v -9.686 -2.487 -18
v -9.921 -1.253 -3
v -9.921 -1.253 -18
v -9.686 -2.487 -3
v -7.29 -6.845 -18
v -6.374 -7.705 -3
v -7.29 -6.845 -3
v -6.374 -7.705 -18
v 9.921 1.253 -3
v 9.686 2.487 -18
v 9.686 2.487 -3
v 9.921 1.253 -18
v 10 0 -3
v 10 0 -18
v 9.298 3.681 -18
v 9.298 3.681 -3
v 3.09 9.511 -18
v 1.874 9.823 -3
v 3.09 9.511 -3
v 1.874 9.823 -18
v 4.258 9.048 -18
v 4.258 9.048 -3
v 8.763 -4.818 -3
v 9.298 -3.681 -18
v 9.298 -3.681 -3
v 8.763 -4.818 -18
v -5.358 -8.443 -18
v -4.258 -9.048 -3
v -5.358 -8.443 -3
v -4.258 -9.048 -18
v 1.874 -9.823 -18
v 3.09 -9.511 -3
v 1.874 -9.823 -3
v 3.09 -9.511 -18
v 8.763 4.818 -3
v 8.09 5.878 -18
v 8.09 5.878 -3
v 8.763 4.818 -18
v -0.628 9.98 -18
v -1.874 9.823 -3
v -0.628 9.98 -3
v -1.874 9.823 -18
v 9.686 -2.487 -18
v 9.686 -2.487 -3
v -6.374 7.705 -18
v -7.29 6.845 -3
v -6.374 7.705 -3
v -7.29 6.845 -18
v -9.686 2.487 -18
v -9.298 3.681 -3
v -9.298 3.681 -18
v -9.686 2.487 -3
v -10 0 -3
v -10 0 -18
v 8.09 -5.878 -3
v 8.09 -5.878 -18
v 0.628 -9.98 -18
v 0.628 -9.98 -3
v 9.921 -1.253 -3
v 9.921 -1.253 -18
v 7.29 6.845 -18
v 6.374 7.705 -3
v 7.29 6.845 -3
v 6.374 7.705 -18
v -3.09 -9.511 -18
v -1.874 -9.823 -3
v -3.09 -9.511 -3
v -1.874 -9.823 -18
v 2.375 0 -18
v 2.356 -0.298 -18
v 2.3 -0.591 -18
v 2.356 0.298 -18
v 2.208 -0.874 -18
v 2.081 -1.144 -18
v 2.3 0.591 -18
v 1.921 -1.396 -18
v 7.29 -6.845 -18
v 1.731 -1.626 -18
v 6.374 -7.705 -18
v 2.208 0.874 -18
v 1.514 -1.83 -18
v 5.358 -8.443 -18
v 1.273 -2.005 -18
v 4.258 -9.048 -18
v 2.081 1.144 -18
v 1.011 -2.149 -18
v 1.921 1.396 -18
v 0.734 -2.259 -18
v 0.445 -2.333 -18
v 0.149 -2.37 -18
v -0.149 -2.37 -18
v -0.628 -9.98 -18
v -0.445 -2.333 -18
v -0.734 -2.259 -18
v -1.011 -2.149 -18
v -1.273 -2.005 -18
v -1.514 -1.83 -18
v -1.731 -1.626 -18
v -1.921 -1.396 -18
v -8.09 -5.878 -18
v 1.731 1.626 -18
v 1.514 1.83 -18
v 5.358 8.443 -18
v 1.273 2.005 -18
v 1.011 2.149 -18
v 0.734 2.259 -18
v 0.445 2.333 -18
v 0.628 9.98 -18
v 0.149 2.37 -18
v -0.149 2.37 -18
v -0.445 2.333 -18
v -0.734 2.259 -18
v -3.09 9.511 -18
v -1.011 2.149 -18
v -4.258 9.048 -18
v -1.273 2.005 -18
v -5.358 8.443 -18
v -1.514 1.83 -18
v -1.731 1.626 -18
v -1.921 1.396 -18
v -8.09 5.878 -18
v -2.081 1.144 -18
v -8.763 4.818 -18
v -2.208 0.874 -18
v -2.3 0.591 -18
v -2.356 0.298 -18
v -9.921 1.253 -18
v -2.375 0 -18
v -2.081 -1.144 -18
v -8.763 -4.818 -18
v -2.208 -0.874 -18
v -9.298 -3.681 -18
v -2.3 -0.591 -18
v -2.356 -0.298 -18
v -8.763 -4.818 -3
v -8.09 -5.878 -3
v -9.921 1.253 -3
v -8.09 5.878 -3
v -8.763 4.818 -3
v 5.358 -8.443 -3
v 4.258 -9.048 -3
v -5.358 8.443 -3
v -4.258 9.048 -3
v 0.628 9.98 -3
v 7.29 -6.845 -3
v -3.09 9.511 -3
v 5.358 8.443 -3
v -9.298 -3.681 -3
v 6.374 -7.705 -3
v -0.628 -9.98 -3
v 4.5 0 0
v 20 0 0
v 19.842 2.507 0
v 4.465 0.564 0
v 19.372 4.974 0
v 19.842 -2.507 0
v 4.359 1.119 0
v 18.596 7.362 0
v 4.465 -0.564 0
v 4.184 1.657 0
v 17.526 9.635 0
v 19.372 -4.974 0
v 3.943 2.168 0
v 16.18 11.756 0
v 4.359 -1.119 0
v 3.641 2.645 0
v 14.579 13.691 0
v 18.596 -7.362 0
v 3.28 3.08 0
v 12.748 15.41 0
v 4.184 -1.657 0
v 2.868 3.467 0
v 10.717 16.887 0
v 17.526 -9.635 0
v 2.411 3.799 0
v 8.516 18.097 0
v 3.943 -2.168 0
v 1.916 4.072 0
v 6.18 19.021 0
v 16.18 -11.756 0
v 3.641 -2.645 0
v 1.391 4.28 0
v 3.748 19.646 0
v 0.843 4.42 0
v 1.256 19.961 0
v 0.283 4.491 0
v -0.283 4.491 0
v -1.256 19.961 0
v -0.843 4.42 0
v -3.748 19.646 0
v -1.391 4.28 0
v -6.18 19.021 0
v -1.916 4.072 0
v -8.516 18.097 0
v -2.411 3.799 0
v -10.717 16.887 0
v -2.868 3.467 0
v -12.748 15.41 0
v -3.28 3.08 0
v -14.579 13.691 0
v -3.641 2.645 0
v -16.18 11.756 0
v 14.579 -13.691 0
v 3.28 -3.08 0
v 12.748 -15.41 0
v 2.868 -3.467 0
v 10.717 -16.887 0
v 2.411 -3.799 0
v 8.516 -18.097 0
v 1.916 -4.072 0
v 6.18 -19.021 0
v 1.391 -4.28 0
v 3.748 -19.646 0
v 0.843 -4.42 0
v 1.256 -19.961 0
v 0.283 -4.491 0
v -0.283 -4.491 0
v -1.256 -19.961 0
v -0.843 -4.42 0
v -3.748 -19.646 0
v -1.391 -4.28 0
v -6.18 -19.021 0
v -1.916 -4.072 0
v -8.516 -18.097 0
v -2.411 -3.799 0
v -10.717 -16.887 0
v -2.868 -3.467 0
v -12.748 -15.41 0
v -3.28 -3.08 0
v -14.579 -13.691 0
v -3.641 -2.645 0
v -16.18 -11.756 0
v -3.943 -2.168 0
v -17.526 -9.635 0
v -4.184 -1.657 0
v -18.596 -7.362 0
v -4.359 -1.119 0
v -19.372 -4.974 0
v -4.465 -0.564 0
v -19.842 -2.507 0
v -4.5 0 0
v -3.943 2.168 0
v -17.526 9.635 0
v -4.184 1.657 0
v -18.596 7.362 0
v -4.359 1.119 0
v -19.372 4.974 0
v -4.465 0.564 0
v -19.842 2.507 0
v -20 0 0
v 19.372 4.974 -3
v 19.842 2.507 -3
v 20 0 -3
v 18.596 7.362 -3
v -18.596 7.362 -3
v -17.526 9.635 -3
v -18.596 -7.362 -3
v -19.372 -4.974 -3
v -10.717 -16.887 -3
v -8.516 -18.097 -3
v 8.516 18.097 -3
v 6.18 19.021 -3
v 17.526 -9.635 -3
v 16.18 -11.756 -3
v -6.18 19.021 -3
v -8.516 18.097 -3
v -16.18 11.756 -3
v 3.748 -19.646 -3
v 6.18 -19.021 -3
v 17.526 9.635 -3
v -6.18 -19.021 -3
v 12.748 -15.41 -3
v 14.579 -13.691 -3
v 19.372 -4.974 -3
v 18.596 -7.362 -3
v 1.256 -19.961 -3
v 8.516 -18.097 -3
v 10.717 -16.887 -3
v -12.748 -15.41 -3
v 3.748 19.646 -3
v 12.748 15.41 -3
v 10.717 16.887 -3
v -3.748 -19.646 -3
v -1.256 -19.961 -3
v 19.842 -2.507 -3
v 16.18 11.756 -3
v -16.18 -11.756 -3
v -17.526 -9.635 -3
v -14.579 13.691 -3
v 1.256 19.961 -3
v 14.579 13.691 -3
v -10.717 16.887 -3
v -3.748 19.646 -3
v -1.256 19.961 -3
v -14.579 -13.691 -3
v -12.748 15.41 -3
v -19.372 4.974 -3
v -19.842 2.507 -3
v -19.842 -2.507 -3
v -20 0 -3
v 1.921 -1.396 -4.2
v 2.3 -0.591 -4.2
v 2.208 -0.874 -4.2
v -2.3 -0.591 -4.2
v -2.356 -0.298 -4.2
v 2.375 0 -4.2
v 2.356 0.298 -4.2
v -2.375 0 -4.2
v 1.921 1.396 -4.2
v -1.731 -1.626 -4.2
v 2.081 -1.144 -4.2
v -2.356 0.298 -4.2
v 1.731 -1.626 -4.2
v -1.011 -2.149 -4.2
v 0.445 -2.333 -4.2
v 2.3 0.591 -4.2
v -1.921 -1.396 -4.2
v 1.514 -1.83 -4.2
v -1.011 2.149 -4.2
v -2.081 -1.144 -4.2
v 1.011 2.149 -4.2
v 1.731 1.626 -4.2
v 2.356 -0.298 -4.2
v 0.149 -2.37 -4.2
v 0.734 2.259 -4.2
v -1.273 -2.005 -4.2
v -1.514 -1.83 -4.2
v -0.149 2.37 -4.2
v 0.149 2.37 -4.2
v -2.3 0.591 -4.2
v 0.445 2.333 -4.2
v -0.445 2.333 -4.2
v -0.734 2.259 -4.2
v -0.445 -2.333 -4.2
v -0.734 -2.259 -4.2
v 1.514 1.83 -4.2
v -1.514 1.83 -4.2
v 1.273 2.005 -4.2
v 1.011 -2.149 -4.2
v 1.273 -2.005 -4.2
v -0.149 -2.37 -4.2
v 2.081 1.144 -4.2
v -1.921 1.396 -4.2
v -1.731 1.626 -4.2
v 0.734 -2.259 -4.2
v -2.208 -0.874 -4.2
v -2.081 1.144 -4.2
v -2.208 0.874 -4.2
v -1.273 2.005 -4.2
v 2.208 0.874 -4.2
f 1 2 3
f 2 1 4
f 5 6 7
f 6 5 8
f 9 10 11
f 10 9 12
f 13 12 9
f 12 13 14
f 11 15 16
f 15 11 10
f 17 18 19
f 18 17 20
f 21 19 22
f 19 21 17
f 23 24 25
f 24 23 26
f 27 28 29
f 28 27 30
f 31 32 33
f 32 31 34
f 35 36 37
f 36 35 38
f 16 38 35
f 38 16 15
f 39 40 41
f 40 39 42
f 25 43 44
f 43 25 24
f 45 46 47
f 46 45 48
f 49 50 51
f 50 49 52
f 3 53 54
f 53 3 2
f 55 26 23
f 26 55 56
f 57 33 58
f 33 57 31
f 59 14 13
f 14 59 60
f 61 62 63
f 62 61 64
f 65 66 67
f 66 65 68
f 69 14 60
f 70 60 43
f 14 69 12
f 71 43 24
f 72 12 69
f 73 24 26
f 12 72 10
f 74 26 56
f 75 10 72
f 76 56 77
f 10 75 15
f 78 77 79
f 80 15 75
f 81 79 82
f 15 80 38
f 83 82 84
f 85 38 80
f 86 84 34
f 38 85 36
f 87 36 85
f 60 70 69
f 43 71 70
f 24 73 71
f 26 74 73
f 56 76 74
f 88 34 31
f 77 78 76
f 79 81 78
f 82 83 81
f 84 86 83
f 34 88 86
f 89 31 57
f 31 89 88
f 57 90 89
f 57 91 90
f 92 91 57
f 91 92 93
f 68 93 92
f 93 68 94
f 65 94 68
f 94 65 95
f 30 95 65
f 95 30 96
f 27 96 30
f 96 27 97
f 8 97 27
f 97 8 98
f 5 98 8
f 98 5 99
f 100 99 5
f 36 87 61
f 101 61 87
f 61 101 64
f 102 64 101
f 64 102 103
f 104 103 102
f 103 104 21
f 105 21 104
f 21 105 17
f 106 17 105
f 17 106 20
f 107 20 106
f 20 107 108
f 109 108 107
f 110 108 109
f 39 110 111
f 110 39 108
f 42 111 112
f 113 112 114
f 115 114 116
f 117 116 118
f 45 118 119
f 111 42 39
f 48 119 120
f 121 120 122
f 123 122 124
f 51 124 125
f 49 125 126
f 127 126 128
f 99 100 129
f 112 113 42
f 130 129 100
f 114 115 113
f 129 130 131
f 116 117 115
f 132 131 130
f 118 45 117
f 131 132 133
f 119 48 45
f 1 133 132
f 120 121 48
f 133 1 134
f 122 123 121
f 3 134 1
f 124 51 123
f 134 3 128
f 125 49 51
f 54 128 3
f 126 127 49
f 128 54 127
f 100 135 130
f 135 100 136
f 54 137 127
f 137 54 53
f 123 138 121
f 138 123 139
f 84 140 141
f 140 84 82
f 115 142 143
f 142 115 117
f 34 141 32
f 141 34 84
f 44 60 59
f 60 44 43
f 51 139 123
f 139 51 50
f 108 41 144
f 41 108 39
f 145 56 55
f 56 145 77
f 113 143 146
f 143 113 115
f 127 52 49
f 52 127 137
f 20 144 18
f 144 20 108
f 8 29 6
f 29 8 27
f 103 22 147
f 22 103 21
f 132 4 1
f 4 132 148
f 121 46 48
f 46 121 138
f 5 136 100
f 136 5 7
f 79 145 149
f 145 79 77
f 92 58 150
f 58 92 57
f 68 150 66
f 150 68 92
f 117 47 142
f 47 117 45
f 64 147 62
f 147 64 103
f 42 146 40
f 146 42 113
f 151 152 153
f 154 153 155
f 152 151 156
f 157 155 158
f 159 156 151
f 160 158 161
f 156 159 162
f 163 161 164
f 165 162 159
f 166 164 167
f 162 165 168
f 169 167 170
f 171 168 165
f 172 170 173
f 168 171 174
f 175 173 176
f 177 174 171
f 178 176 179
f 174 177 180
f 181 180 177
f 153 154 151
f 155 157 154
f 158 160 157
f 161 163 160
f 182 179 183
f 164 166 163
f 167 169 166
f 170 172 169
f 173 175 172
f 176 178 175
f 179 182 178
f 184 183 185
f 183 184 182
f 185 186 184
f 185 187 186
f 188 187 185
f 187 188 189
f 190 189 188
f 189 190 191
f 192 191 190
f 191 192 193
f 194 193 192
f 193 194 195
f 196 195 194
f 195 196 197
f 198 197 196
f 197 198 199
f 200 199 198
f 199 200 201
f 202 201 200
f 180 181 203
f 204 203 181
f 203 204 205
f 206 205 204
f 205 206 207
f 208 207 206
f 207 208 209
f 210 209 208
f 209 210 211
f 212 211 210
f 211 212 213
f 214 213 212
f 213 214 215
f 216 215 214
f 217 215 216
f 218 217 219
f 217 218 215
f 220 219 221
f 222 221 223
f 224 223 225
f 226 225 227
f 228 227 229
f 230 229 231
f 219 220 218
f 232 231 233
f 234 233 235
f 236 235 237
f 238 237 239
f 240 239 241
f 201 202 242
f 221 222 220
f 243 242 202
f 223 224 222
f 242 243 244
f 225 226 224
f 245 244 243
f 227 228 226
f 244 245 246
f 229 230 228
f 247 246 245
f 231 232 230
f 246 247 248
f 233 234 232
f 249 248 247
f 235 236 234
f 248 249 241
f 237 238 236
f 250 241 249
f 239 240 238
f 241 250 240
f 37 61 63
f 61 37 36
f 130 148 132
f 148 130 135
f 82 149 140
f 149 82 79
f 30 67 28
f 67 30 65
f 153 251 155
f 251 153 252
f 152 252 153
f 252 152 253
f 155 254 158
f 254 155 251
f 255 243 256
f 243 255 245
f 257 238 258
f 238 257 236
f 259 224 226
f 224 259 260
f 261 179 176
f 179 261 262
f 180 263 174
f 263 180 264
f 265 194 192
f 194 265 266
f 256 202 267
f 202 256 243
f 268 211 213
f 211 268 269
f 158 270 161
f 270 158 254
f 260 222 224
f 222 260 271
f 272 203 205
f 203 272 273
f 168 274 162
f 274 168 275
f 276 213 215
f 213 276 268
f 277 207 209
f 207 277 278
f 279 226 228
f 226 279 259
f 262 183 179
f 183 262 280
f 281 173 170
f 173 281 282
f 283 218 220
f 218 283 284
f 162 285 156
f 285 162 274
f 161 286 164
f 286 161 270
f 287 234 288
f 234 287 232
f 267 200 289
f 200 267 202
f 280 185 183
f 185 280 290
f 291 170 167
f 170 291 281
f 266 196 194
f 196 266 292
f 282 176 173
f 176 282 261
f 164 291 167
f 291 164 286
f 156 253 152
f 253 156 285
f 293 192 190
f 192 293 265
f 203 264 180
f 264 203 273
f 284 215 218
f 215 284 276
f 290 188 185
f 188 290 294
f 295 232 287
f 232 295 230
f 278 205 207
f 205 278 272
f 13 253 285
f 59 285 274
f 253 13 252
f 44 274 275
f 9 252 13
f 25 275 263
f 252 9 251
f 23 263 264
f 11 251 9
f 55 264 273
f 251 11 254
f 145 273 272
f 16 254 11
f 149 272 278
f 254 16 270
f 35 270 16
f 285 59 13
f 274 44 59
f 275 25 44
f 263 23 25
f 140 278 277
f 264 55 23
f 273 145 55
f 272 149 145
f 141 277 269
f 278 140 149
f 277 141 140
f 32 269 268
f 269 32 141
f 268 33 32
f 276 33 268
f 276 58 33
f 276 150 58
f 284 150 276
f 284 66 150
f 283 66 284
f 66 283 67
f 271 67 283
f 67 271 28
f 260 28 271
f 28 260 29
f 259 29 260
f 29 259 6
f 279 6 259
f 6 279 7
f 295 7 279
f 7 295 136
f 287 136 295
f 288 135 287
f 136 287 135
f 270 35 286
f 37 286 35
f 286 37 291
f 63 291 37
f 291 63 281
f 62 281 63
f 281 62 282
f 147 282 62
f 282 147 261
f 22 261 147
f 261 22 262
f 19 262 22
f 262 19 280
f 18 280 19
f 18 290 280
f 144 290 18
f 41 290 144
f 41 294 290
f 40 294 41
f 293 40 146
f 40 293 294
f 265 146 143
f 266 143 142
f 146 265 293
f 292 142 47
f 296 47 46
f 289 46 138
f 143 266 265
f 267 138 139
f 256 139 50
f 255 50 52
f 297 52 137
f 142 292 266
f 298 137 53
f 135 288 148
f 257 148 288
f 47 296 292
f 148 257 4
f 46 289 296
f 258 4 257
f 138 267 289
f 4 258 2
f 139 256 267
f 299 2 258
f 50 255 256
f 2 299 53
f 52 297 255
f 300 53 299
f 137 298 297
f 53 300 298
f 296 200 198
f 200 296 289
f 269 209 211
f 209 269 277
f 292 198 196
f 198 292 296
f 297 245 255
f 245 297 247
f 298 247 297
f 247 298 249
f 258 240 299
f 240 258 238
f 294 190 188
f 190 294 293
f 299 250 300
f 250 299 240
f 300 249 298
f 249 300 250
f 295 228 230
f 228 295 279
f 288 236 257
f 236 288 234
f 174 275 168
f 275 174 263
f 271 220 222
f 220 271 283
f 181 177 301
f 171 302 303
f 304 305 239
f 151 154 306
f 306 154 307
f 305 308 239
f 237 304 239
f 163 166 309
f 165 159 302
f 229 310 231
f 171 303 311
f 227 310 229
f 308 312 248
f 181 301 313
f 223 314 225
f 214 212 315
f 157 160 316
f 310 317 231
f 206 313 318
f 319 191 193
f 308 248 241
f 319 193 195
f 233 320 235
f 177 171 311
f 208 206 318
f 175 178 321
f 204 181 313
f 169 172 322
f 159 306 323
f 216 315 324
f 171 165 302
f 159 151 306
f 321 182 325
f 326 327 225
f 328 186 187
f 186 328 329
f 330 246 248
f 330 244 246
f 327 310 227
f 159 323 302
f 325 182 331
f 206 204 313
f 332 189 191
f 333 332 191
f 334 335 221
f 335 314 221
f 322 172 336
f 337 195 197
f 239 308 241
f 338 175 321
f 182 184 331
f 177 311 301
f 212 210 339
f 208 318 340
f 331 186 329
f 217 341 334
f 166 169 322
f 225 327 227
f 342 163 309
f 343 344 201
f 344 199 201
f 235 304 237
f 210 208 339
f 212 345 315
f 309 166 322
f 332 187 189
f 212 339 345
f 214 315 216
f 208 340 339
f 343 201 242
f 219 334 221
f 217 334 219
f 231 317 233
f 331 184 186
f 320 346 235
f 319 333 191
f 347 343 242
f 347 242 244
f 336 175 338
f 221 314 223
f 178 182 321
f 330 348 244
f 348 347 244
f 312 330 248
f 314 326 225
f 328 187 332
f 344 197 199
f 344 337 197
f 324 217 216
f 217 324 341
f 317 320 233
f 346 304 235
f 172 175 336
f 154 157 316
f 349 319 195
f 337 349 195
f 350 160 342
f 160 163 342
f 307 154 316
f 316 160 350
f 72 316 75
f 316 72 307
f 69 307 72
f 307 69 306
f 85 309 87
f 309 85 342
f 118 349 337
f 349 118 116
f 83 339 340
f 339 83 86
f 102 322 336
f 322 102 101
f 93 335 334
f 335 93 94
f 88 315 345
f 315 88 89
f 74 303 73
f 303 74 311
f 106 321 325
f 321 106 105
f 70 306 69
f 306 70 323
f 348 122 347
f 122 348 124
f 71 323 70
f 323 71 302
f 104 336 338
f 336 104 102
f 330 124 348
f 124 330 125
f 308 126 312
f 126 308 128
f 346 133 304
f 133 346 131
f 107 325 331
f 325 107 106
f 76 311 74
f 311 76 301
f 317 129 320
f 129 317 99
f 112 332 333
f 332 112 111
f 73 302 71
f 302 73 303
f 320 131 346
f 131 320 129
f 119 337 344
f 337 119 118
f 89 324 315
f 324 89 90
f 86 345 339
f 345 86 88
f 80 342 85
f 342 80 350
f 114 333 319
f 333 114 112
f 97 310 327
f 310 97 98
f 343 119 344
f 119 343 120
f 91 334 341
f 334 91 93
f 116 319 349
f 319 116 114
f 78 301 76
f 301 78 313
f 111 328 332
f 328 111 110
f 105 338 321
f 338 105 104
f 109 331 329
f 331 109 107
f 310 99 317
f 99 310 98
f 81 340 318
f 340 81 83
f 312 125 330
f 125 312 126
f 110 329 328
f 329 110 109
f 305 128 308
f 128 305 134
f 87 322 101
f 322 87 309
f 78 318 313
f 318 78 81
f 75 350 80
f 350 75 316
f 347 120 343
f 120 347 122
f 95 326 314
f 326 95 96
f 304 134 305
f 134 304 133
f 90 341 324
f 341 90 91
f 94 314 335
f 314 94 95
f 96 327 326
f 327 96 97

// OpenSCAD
$fn = 50;


difference() {
	union() {
		translate(v = [0, 0, -18.0000000000]) {
			cylinder(h = 18, r = 10.0000000000);
		}
		translate(v = [0, 0, -3.0000000000]) {
			cylinder(h = 3, r = 20.0000000000);
		}
	}
	union() {
		translate(v = [0, 0, 0]) {
			rotate(a = [0, 0, 0]) {
				difference() {
					union() {
						#translate(v = [0, 0, -18.0000000000]) {
							cylinder(h = 18, r = 2.2500000000);
						}
						#translate(v = [0, 0, -4.2000000000]) {
							cylinder(h = 4.2000000000, r = 10.0000000000, r1 = 2.3750000000, r2 = 4.5000000000);
						}
						#translate(v = [0, 0, -18.0000000000]) {
							cylinder(h = 18, r = 2.3750000000);
						}
						#translate(v = [0, 0, -18.0000000000]) {
							cylinder(h = 18, r = 2.2500000000);
						}
					}
					union();
				}
			}
		}
	}
}
